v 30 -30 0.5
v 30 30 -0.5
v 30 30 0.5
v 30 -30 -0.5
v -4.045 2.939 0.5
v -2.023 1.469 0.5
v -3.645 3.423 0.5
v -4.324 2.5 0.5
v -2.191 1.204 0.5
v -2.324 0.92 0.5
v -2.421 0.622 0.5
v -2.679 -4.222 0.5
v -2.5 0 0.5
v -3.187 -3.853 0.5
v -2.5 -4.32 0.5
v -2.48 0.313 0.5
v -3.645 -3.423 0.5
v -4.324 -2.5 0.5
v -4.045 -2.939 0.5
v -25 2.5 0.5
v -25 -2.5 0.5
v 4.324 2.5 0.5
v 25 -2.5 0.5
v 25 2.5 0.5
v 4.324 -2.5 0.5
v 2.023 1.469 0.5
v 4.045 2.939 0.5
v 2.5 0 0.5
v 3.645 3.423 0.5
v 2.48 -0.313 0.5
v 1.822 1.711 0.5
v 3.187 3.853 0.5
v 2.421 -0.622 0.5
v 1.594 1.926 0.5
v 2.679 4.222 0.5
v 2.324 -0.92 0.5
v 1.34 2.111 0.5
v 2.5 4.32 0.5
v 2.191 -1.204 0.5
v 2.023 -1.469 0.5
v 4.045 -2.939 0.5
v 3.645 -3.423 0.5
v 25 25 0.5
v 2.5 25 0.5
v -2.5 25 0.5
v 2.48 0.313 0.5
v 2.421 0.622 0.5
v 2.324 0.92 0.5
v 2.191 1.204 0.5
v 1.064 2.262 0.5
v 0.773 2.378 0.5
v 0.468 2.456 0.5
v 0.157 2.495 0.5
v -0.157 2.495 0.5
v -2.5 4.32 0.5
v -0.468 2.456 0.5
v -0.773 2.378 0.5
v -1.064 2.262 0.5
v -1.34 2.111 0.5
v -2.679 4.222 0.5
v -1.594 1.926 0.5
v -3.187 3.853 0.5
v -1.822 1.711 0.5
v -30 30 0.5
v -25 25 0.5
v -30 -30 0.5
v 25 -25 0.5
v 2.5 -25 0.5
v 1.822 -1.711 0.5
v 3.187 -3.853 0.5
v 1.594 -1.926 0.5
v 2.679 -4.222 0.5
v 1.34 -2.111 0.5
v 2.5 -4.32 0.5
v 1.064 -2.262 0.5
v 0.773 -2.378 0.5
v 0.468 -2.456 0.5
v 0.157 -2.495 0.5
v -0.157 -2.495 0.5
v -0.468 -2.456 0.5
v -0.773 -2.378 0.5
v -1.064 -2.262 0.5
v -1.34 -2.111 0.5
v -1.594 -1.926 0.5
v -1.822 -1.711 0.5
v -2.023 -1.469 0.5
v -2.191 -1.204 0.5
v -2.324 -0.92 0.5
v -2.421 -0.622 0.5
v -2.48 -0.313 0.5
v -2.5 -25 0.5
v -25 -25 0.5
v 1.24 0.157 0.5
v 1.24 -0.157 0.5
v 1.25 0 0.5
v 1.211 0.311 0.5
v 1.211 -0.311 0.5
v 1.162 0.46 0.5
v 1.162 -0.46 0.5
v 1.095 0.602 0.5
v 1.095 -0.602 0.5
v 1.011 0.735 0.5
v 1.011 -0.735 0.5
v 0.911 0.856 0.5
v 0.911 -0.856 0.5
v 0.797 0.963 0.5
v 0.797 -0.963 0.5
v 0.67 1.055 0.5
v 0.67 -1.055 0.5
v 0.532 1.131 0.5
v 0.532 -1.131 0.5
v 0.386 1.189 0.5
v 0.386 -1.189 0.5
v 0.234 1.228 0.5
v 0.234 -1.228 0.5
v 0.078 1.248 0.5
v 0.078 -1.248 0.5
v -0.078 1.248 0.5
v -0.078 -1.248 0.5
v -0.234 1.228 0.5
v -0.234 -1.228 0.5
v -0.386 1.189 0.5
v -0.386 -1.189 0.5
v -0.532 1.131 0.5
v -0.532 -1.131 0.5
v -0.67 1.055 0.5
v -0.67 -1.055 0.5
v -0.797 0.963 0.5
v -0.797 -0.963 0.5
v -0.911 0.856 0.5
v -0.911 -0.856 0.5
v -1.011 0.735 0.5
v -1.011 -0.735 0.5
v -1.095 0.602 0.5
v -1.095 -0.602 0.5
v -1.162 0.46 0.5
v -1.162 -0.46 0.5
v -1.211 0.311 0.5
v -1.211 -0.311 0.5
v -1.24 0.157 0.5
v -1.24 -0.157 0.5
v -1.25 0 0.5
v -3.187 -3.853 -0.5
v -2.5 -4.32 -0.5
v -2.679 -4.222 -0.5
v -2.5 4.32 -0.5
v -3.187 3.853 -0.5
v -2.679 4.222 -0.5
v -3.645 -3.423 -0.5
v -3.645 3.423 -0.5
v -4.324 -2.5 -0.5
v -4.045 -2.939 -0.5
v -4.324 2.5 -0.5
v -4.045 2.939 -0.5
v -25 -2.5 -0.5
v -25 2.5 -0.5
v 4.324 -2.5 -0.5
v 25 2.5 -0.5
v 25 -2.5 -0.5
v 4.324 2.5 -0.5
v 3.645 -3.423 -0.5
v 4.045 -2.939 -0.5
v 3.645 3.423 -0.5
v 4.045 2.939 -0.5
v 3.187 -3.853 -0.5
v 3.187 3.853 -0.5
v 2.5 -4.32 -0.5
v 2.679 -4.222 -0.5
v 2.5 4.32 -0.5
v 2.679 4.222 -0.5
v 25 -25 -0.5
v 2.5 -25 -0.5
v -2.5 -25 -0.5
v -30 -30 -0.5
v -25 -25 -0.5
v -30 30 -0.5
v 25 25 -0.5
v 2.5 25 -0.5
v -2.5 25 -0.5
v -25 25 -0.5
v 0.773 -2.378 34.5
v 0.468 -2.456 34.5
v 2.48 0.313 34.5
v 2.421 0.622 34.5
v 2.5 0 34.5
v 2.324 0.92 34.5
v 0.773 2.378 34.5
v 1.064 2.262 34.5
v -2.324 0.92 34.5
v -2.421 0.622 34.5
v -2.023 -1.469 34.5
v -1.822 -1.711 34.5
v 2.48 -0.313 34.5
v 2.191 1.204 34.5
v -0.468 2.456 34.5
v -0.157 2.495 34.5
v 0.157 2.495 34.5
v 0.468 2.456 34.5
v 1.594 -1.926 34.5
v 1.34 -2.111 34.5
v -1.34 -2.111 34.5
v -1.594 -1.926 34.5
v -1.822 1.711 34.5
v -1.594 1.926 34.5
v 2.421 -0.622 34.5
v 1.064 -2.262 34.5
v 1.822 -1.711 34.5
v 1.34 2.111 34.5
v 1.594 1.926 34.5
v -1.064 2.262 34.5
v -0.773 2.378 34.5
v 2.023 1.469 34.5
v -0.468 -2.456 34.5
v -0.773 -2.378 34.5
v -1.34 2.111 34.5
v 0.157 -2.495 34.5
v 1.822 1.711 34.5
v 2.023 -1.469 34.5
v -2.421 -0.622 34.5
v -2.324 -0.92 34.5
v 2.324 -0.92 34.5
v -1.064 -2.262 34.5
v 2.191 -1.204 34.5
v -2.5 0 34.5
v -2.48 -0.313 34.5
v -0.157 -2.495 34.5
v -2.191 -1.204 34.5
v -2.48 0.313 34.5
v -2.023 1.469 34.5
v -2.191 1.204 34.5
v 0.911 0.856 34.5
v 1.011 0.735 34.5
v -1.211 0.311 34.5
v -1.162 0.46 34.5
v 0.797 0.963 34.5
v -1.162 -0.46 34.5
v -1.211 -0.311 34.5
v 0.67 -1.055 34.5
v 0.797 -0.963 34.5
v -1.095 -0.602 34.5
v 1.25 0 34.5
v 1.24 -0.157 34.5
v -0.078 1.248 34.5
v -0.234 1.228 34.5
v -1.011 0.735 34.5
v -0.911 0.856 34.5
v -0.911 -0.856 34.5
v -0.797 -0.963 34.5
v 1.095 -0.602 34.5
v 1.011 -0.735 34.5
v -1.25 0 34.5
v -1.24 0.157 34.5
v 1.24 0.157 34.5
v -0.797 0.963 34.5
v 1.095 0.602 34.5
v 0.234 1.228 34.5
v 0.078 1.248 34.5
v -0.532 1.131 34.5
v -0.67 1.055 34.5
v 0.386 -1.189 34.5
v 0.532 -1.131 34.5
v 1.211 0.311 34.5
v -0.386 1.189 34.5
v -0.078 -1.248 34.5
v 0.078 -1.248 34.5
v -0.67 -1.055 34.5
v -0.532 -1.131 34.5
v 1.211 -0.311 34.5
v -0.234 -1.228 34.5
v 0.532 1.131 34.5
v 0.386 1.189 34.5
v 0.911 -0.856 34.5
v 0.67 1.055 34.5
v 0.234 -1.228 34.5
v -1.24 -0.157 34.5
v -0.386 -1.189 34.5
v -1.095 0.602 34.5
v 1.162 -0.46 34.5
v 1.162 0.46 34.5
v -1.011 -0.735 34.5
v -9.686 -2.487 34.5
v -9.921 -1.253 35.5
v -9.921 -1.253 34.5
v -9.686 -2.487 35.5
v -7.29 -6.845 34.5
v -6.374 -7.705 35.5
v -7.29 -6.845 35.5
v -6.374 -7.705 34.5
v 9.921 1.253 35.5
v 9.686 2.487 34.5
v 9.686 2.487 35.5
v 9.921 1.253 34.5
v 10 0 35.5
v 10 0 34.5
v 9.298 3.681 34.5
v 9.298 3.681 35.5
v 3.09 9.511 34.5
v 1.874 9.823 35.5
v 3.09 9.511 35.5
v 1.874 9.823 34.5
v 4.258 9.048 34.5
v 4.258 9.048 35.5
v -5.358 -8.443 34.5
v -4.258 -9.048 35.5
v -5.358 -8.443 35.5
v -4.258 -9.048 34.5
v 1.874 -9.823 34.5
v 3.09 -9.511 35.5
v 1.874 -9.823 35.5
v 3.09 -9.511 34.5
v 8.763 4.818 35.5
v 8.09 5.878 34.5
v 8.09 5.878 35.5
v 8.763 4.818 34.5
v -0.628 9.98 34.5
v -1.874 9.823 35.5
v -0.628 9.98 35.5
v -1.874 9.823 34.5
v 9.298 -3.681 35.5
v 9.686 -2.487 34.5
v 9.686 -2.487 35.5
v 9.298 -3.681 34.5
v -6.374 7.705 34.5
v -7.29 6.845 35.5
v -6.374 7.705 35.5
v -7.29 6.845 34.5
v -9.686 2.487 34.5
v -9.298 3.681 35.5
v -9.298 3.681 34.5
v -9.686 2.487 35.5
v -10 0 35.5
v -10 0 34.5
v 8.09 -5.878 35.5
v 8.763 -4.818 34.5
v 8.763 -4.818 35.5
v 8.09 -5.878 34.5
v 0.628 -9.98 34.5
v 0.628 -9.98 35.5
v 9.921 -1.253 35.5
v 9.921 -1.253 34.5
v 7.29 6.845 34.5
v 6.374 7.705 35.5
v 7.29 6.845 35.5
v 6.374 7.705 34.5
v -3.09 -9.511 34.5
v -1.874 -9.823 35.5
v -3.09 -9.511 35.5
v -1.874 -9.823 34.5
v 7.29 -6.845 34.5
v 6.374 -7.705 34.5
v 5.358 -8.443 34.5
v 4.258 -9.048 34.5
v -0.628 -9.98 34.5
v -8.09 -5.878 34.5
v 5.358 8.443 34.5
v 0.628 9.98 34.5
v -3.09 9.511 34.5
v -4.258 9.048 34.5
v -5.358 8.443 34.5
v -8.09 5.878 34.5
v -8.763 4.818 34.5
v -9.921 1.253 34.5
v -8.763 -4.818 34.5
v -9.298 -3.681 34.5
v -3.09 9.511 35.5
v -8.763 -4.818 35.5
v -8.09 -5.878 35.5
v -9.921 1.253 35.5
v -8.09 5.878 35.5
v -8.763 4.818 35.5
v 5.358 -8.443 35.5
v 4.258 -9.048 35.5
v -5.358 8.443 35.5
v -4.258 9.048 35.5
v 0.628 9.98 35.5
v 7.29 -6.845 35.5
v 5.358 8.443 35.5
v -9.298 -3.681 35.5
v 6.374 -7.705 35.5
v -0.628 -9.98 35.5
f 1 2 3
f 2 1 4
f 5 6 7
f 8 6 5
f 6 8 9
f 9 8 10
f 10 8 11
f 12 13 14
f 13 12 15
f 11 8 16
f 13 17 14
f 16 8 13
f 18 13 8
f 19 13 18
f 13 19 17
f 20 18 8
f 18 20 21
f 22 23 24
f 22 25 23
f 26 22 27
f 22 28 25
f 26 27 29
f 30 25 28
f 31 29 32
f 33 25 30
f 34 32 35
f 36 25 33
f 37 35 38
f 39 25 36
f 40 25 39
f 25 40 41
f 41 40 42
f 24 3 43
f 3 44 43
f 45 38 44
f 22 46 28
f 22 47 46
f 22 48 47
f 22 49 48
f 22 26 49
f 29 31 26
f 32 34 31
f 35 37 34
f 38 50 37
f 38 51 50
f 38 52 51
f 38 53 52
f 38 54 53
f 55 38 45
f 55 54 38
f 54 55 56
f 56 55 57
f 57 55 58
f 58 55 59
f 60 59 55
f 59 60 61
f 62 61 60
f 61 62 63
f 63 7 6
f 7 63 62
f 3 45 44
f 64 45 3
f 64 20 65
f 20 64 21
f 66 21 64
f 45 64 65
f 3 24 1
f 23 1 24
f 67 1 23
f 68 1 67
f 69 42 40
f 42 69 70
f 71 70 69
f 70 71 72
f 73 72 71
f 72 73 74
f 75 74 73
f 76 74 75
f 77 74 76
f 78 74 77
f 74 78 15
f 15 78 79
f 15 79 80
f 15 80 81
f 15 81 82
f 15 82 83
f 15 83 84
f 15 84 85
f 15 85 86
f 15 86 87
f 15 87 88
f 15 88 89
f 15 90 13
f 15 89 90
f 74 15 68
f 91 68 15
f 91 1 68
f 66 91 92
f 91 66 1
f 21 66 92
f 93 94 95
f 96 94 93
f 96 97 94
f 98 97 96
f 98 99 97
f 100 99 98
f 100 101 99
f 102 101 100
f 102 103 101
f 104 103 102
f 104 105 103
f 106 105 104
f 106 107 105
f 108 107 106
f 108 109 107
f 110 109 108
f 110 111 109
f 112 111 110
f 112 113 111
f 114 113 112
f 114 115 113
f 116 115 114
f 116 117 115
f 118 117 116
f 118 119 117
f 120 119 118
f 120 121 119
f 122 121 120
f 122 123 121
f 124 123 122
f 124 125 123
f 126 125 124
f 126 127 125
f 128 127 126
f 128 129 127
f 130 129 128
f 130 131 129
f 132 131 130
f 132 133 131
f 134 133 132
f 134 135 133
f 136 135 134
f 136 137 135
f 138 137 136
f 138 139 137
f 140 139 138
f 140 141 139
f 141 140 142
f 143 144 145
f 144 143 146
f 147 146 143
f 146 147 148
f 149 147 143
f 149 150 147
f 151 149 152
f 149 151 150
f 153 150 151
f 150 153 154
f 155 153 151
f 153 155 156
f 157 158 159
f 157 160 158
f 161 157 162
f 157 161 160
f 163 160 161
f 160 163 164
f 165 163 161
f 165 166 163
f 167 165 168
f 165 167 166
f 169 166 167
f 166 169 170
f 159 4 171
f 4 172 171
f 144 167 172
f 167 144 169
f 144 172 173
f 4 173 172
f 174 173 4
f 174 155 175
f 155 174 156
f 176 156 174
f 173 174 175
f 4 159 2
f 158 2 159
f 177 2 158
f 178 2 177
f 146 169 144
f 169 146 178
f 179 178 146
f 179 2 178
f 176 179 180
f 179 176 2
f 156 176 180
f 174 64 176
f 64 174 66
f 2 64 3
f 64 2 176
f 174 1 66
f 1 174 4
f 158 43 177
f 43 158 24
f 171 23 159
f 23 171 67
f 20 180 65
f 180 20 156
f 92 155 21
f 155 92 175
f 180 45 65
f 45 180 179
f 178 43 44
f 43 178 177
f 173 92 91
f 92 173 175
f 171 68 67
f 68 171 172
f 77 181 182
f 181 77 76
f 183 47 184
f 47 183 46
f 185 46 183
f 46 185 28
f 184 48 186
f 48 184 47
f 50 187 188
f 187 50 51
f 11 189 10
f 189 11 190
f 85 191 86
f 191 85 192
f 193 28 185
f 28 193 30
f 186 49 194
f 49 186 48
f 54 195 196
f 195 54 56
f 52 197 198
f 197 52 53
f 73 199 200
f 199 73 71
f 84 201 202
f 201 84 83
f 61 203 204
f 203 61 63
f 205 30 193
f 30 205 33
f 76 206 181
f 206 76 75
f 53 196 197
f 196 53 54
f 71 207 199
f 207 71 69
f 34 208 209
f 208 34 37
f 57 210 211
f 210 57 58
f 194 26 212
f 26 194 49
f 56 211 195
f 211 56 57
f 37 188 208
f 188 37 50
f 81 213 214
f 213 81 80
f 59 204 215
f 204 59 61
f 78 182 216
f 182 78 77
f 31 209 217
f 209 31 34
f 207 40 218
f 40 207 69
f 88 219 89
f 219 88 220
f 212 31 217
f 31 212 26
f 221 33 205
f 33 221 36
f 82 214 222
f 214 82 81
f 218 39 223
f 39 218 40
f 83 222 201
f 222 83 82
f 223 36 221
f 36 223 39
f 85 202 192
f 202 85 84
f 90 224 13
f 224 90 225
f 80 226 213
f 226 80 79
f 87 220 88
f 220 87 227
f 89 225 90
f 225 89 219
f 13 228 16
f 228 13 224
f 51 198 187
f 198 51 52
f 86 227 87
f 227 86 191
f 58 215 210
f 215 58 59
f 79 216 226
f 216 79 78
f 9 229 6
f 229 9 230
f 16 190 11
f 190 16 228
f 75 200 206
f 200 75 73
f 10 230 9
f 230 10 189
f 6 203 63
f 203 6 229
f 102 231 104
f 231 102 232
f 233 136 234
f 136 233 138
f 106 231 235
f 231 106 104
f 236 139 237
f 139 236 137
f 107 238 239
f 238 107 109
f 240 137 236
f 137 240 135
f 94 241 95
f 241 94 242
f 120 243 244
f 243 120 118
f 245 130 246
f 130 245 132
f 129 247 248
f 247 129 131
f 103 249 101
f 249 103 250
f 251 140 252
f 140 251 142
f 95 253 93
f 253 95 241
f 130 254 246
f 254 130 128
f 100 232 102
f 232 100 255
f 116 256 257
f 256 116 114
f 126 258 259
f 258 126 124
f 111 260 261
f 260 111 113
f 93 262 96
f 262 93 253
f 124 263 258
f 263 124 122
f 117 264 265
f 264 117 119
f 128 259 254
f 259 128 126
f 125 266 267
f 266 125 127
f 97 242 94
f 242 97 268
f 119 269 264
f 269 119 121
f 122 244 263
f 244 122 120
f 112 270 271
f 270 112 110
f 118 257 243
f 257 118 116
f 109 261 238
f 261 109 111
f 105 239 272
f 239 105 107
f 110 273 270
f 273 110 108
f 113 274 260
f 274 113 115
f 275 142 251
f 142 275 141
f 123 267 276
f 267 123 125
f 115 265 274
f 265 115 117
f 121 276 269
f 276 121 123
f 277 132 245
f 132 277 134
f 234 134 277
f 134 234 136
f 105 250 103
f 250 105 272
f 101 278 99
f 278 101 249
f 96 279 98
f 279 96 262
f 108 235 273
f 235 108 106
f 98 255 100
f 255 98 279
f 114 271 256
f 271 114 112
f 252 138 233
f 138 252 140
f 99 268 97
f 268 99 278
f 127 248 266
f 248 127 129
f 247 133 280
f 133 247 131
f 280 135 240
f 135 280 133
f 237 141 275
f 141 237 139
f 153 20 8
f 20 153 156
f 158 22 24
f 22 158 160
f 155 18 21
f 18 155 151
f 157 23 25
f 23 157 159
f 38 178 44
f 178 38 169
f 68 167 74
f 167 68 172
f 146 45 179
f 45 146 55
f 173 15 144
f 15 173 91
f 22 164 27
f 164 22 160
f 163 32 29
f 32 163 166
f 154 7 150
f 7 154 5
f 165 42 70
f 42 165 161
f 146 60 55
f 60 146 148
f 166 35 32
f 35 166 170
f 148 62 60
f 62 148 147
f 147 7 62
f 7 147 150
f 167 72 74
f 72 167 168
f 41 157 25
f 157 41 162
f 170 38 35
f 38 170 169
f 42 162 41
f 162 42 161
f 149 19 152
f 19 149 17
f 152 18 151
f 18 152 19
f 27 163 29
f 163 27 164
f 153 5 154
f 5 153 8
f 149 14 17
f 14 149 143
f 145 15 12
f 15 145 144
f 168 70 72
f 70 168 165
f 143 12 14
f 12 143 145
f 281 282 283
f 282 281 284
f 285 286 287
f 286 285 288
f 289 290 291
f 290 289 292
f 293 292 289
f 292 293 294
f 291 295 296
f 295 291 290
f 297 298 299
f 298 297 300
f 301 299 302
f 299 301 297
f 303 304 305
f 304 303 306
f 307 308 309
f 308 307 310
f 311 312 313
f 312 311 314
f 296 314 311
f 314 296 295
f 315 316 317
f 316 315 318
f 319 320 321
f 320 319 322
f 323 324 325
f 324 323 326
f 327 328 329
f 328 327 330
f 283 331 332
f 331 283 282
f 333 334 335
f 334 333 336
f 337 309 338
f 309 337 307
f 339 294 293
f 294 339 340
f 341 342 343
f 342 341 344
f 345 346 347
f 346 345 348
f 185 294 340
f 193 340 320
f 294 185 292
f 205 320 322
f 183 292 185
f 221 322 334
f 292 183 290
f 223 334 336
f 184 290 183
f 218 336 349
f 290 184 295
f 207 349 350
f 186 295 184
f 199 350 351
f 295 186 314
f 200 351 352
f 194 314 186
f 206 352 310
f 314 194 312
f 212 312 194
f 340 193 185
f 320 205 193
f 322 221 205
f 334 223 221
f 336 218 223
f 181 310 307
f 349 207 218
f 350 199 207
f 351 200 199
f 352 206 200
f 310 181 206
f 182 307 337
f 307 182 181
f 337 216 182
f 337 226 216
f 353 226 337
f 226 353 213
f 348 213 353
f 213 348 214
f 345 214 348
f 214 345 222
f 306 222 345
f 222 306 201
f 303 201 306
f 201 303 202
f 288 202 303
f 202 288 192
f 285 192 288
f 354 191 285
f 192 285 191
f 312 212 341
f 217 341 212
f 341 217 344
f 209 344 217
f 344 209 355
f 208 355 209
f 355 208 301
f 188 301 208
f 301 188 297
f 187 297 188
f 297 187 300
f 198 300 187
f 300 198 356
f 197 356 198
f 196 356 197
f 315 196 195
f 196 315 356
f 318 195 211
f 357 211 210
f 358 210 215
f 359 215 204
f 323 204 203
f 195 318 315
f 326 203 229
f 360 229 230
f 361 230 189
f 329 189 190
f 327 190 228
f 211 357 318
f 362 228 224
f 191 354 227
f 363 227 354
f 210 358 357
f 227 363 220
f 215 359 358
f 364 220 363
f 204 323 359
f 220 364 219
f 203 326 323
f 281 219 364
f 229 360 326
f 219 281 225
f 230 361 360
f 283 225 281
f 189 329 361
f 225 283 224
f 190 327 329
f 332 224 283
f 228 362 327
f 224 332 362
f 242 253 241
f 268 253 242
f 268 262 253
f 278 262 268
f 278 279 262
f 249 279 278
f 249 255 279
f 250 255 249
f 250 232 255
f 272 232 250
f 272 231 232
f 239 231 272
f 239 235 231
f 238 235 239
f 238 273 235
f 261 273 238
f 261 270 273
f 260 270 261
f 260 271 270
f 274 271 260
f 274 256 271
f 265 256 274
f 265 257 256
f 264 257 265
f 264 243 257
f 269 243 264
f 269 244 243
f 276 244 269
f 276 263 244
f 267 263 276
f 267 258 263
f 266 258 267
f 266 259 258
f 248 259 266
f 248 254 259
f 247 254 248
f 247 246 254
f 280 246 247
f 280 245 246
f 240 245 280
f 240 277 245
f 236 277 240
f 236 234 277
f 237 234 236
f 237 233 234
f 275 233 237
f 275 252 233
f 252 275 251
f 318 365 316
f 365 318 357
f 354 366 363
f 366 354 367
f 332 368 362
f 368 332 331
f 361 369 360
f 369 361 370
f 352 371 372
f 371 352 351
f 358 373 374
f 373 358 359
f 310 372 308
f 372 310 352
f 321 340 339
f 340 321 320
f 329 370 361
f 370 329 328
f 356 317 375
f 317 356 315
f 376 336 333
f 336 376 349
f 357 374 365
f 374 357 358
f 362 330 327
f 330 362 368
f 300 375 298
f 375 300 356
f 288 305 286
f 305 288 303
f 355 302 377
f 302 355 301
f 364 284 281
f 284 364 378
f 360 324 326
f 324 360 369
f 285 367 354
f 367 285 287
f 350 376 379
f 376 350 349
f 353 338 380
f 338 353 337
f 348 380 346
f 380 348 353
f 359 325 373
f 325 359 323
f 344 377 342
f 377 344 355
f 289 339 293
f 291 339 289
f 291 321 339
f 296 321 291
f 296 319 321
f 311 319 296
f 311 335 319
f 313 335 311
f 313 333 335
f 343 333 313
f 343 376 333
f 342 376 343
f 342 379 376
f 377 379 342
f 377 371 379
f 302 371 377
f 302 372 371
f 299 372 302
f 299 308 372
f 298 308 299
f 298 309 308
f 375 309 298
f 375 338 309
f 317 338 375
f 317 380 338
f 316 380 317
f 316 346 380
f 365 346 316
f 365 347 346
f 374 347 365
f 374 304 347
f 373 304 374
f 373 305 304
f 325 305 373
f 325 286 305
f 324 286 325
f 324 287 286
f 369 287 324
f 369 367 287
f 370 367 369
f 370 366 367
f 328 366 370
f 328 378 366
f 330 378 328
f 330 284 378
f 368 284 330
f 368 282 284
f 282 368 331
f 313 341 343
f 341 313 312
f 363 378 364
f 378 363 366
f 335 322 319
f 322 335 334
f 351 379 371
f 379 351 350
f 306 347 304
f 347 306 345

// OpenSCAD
// Rod Height
rod_height = 35; // [1:150]

// Rod Diameter
rod_diameter=5; // [2:20]

// Wall Cylinder Base Diameter
base_diameter = 20; // [10:100]

// Photo Frame Base Width
frame_width=60; // [10:150]

/* [Hidden] */

$fn=50;
rod_half=rod_height/2;

quarter_frame=(frame_width-(rod_diameter*3))/2;

difference()
{
    cube([frame_width,frame_width,1], center=true);
    cube([frame_width-(rod_diameter*2),frame_width-(rod_diameter*2),1], center=true);
}

cube([frame_width,rod_diameter,1], center=true);
cube([rod_diameter,frame_width,1], center=true);
cylinder(h=1, r=rod_diameter, center=true);

translate([0,0,rod_half]) 
{
    difference()
    {
        cylinder(h=rod_height, r=rod_diameter/2, center=true);
        cylinder(h=rod_height, r=rod_diameter/4, center=true);
    }
}

translate([0,0,rod_height])
{
    cylinder(h=1,r=base_diameter/2, center=true);
}
